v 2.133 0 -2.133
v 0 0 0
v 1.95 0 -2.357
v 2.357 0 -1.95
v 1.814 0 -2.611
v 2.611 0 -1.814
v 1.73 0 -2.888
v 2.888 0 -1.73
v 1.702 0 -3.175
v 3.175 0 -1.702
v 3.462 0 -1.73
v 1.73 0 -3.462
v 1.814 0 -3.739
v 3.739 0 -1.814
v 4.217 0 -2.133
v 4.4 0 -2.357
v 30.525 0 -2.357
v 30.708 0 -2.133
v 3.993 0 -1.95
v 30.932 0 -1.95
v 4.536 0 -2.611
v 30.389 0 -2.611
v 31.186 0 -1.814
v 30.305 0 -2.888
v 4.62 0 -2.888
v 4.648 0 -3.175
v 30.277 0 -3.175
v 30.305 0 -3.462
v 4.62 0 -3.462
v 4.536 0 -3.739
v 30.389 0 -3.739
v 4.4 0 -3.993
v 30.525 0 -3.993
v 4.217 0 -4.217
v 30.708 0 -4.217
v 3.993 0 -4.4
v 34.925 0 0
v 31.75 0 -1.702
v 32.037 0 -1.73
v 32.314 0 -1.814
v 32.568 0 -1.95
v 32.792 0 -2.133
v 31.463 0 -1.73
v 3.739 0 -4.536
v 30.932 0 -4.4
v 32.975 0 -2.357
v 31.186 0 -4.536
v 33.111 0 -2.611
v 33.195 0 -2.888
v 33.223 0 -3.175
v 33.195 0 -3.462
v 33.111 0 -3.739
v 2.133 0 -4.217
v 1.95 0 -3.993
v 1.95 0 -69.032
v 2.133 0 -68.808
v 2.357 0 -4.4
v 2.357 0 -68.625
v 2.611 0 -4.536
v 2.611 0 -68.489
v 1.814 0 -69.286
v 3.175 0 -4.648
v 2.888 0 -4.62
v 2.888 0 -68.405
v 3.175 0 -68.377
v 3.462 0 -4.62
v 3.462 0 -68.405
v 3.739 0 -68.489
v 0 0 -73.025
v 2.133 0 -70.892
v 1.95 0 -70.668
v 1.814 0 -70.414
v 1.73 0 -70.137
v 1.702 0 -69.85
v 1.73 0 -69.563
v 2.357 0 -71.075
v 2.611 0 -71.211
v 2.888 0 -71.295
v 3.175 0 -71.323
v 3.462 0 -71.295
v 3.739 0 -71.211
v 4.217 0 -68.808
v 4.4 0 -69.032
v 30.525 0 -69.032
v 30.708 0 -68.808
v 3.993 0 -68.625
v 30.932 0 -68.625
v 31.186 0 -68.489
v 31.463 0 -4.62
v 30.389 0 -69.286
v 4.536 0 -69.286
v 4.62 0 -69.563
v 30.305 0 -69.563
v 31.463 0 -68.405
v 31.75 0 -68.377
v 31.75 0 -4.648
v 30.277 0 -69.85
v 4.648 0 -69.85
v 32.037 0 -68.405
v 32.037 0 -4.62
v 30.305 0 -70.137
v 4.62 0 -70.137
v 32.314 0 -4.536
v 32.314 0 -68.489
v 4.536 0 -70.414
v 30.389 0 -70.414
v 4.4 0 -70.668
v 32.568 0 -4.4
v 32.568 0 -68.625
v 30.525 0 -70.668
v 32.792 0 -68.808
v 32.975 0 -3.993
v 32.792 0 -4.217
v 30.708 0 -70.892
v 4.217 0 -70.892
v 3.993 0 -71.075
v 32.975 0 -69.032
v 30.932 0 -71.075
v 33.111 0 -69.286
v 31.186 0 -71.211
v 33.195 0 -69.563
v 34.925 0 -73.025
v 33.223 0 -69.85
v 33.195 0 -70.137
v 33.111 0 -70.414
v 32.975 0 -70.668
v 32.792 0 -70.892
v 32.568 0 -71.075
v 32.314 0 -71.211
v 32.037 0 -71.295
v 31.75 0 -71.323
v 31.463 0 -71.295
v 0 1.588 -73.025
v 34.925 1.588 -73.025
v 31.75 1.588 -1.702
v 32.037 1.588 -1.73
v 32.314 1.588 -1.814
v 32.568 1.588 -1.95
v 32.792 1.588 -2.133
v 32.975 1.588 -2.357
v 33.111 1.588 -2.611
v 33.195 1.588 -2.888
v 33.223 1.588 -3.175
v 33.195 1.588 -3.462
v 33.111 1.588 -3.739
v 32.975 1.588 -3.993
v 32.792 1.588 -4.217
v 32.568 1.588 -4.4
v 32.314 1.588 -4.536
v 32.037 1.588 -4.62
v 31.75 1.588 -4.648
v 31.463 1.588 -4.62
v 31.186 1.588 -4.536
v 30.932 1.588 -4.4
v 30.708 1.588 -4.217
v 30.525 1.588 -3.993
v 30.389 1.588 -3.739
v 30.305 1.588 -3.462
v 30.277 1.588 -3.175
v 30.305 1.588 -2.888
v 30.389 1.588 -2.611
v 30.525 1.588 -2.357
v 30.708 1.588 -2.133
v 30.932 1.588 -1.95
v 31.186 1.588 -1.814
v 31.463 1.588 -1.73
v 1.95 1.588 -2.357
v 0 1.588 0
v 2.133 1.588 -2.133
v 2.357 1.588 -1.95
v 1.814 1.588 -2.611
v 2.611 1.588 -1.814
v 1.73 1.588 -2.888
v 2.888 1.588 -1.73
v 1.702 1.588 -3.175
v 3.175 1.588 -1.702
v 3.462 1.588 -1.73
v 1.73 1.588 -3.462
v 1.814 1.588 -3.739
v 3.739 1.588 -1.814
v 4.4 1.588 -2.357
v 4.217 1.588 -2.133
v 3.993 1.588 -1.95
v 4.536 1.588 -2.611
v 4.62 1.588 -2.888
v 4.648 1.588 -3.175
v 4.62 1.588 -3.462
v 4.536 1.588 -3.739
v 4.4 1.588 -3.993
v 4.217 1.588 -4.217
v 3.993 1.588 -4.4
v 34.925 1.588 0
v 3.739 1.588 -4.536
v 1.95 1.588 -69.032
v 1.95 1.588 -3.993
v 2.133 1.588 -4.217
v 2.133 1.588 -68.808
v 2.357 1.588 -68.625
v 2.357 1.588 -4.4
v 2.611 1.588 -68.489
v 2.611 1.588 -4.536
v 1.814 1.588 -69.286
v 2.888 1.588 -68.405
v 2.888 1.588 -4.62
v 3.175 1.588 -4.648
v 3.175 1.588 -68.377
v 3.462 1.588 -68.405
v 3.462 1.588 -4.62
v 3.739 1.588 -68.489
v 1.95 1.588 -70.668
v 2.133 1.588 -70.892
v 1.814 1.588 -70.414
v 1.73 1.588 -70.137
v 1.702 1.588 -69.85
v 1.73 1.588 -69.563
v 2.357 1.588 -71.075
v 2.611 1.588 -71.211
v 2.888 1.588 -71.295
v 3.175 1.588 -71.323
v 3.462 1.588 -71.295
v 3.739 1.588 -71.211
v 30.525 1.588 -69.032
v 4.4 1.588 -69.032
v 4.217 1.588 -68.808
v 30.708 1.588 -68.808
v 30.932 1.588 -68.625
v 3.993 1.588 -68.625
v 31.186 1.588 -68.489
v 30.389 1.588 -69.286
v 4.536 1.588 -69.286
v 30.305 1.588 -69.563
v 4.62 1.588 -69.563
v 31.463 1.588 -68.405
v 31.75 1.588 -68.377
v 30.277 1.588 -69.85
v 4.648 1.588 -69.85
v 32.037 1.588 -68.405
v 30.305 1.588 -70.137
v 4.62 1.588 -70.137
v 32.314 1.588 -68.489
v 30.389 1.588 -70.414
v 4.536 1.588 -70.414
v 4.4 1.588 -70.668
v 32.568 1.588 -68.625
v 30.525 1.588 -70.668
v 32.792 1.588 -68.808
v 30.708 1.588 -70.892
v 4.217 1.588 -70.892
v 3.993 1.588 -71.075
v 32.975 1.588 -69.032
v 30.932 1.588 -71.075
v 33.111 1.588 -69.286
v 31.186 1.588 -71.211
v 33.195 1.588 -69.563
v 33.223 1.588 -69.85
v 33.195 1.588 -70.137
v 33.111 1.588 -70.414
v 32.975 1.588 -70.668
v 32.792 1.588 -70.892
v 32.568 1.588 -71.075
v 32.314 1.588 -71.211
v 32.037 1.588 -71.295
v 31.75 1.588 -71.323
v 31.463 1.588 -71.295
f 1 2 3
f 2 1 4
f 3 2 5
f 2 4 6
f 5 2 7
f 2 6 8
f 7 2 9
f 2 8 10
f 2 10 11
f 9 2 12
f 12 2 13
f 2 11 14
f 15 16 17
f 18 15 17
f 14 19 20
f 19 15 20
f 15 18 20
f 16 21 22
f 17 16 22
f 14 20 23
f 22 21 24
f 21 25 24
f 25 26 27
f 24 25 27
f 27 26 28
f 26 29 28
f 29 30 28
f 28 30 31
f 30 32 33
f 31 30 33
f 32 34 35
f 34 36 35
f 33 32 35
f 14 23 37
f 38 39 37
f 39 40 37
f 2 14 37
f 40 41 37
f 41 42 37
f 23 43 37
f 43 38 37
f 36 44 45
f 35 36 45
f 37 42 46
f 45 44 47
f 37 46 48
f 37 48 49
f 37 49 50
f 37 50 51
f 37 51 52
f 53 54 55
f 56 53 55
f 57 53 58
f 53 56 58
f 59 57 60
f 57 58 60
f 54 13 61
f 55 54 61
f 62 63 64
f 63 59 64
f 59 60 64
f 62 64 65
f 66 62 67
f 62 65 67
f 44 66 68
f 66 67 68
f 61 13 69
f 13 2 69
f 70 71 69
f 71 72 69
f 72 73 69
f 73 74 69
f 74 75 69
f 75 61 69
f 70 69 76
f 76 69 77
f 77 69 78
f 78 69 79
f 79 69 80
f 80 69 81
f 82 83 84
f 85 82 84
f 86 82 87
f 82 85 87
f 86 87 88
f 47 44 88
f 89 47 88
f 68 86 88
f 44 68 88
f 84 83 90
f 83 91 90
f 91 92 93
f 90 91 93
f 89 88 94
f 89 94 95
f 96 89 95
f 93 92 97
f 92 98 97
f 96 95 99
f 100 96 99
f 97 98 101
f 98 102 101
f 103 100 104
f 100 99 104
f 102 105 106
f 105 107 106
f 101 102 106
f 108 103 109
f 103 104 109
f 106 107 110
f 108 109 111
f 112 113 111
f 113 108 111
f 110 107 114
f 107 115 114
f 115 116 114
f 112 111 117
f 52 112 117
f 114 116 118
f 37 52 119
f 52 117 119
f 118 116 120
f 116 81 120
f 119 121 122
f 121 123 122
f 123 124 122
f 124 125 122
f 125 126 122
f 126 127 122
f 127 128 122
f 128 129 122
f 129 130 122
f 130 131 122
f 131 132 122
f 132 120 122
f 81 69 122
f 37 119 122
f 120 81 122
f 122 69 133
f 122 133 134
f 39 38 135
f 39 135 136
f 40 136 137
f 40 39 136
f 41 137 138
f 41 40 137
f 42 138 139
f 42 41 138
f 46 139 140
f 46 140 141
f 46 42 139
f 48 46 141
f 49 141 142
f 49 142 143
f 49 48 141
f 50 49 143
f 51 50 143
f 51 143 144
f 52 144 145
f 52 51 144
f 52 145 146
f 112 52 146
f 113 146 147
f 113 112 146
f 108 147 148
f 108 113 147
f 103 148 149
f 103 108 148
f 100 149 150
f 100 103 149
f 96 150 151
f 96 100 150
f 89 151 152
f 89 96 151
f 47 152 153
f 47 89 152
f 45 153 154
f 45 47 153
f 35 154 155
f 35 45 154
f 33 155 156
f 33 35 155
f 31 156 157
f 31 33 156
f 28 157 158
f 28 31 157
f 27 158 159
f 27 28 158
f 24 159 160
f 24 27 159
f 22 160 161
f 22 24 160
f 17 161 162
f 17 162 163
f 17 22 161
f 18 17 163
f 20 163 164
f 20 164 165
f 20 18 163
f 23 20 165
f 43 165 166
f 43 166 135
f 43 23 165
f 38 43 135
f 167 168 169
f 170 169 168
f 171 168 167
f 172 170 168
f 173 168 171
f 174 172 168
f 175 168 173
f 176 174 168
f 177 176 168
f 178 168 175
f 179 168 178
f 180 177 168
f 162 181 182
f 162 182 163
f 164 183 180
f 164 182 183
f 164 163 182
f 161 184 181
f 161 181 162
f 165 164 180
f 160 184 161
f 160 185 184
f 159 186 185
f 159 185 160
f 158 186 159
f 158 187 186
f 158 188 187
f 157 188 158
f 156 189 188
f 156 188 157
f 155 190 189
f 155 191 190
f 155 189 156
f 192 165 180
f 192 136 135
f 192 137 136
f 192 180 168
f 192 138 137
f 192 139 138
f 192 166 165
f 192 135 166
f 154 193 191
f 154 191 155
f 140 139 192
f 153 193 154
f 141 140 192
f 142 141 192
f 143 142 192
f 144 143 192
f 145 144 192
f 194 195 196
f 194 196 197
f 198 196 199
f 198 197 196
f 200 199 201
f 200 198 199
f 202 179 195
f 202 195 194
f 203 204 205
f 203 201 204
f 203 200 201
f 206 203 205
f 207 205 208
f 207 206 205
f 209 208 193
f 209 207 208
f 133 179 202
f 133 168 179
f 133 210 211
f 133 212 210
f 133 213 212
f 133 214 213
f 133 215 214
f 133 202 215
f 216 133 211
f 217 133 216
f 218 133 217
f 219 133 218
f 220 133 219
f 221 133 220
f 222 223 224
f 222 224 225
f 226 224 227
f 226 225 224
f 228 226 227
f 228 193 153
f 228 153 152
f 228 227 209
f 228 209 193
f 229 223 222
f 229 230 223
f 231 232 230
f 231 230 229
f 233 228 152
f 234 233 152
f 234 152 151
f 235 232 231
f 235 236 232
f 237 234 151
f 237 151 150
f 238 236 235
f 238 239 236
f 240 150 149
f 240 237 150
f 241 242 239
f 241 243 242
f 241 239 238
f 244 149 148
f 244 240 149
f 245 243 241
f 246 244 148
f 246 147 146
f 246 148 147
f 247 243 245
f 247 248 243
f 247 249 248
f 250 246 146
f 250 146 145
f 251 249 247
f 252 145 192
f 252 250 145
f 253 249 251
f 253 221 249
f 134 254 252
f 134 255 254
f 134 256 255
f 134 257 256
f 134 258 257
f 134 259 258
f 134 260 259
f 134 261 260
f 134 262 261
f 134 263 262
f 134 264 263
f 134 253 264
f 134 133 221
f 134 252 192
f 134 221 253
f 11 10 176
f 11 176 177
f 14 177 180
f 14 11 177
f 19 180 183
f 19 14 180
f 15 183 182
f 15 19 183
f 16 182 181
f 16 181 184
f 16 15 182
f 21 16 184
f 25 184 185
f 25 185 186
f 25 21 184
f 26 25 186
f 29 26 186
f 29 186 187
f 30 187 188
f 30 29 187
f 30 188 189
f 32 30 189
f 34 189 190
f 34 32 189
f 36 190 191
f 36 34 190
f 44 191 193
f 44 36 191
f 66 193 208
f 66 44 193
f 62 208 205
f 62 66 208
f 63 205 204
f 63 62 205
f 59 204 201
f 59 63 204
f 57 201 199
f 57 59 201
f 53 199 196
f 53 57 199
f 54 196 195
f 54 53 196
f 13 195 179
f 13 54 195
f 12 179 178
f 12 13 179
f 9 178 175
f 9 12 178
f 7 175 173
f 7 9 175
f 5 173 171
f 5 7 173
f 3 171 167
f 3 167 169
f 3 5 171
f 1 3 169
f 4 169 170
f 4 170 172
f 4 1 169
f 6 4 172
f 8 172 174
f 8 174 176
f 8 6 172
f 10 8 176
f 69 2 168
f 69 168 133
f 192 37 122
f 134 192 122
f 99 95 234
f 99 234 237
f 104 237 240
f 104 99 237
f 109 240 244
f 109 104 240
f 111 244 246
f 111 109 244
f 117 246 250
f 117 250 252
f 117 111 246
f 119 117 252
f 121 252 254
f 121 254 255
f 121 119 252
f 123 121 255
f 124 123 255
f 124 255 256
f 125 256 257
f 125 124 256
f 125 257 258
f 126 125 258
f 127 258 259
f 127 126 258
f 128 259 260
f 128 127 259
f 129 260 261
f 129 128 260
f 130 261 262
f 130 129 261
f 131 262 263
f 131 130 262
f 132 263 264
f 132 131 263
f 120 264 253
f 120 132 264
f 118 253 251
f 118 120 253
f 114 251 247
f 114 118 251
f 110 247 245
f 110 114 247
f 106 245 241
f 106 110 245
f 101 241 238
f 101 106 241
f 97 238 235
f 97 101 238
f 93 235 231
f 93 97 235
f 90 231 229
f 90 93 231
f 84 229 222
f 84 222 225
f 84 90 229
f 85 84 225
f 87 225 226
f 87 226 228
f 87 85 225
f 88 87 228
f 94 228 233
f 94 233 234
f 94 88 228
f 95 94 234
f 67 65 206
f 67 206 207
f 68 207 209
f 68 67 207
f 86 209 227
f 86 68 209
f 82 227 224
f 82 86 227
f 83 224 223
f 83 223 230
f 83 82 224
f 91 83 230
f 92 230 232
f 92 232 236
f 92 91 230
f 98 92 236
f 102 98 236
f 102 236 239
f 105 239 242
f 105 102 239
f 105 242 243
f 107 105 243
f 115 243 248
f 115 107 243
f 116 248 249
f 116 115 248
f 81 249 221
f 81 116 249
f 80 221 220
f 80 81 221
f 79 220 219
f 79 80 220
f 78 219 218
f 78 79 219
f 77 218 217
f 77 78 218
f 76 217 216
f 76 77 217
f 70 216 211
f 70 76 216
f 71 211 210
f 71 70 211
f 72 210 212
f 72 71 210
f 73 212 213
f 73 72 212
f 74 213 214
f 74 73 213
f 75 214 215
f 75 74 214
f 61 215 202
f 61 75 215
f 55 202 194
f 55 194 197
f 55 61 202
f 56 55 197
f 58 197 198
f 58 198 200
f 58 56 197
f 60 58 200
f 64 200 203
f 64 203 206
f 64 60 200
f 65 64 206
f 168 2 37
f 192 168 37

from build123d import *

# Parameters (mm, degrees)
SKETCH1_W           = 34.925
SKETCH1_H           = 73.025
BOSS_EXTRUDE1_DEPTH = 1.5875
SKETCH1_4_R         = 1.4732
CUT_EXTRUDE1_DEPTH  = 1.5875


with BuildPart() as part:
    # Sketch1 → Boss-Extrude1 (new body)
    with BuildSketch(Plane(origin=(0, 0, 0), x_dir=(1, 0, 0), z_dir=(0, 1, 0))):
        with Locations((17.4625, 36.5125)):
            Rectangle(SKETCH1_W, SKETCH1_H)
    extrude(amount=BOSS_EXTRUDE1_DEPTH)

    # Sketch1<4> → Cut-Extrude1 (cut)
    with BuildSketch(Plane(origin=(0, 0, 0), x_dir=(1, 0, 0), z_dir=(0, 1, 0))):
        with Locations((3.175, 69.85)):
            Circle(SKETCH1_4_R)
        with Locations((31.75, 69.85)):
            Circle(SKETCH1_4_R)
        with Locations((3.175, 3.175)):
            Circle(SKETCH1_4_R)
        with Locations((31.75, 3.175)):
            Circle(SKETCH1_4_R)
    extrude(amount=CUT_EXTRUDE1_DEPTH, mode=Mode.SUBTRACT)


solid = part.part
